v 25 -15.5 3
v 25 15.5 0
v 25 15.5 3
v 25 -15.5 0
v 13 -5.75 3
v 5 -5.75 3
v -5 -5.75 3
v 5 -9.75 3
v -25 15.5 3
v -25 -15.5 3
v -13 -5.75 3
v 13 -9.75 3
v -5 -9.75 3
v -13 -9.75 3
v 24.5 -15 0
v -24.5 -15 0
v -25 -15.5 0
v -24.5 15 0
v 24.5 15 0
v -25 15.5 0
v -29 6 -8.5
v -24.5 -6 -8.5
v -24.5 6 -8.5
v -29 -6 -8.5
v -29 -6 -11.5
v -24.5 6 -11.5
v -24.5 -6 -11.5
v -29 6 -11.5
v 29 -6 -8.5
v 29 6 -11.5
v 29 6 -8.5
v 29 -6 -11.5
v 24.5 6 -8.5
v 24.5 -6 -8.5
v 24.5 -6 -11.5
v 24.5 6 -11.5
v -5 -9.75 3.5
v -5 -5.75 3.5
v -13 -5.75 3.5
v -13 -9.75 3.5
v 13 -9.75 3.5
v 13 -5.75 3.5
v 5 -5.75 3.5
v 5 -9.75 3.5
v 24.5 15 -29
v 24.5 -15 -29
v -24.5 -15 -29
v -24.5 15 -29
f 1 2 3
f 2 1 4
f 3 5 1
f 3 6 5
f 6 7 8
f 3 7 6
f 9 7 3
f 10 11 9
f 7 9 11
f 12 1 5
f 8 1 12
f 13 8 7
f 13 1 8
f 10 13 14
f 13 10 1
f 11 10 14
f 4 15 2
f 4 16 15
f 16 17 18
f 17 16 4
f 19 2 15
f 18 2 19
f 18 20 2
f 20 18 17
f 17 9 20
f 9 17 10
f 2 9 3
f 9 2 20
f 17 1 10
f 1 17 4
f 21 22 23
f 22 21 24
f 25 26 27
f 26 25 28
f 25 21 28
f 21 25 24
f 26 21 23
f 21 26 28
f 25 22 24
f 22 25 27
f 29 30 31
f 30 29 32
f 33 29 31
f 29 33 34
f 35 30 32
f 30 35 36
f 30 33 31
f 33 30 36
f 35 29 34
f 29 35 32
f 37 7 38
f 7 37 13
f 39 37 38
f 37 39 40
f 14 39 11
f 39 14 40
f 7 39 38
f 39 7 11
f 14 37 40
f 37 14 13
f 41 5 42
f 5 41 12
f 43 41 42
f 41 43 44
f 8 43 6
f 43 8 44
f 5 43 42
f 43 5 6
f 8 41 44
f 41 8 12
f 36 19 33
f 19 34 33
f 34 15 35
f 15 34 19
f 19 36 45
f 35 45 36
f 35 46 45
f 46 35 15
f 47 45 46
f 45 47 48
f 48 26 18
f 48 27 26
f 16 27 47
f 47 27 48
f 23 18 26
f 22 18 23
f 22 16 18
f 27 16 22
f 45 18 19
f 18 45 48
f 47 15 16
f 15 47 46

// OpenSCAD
// Parameters
overall_width_mm = 48; //[24:96:1]
overall_height_mm = 29; //[15:58:1]
overall_depth_mm = 24; //[12:48:1]
bezel_width_mm = 50; //[25:100:1]
bezel_height_mm = 31; //[16:62:1]
bezel_thickness_mm = 3; //[1.5:6:0.5]
bezel_corner_radius_mm = 2; //[0:6:0.5]
bezel_bevel_mm = 0.8; //[0:3:0.1]
body_wall_thickness_mm = 1.6; //[0.8:3.2:0.1]
display_window_width_mm = 34; //[17:68:1]
display_window_height_mm = 14; //[7:28:1]
display_window_corner_radius_mm = 1; //[0:4:0.5]
panel_cutout_width_mm = 45; //[22.5:90:1]
panel_cutout_height_mm = 26; //[13:52:1]
panel_thickness_range_mm = 3; //[1:6:0.5]
tab_width_mm = 6; //[3:12:0.5]
tab_height_mm = 12; //[6:24:1]
tab_depth_mm = 3; //[1.5:8:0.5]
tab_offset_z_mm = 10; //[0:20:1]
inner_aperture_width_mm = 40; //[20:80:1]
inner_aperture_height_mm = 20; //[10:40:1]
inner_aperture_depth_mm = 1.2; //[0.6:3:0.1]
button_count = 2; //[0:4:1]
button_width_mm = 8; //[4:16:0.5]
button_height_mm = 4; //[2:10:0.5]
button_depth_mm = 1.5; //[0.8:4:0.1]
assembly_overlap_mm = 1; //[0.5:2:0.1]
clearance_mm = 0.5; //[0.2:1.5:0.1]
rear_clearance_extra_mm = 6; //[3:15:1]

// Panel Meter - complete geometry
module panel_meter() {
  color("Black") {
    // Front Bezel
    translate([0, 0, bezel_thickness_mm / 2])
      cube([bezel_width_mm, bezel_height_mm, bezel_thickness_mm], center=true);
    
    // Meter Body
    translate([0, 0, -overall_depth_mm / 2 + assembly_overlap_mm])
      cube([overall_width_mm, overall_height_mm, overall_depth_mm], center=true);
    
    // Inner Aperture Frame
    difference() {
      translate([0, bezel_height_mm * 0.15, inner_aperture_depth_mm / 2 + assembly_overlap_mm])
        cube([inner_aperture_width_mm, inner_aperture_height_mm, inner_aperture_depth_mm], center=true);
      translate([0, bezel_height_mm * 0.15, inner_aperture_depth_mm / 2 + assembly_overlap_mm])
        cube([display_window_width_mm + 2 * clearance_mm, display_window_height_mm + 2 * clearance_mm, inner_aperture_depth_mm + 2 * assembly_overlap_mm], center=true);
    }
    
    // Mounting Tabs
    translate([-overall_width_mm / 2 - tab_width_mm / 2 + assembly_overlap_mm, 0, -tab_offset_z_mm])
      cube([tab_width_mm, tab_height_mm, tab_depth_mm], center=true);
    translate([overall_width_mm / 2 + tab_width_mm / 2 - assembly_overlap_mm, 0, -tab_offset_z_mm])
      cube([tab_width_mm, tab_height_mm, tab_depth_mm], center=true);
  }
}

// Panel Meter Button - complete geometry
module panel_meter_button() {
  color("Silver") {
    // Front Buttons
    translate([-bezel_width_mm * 0.18, -bezel_height_mm * 0.25, bezel_thickness_mm + button_depth_mm / 2 - assembly_overlap_mm])
      cube([button_width_mm, button_height_mm, button_depth_mm], center=true);
    translate([bezel_width_mm * 0.18, -bezel_height_mm * 0.25, bezel_thickness_mm + button_depth_mm / 2 - assembly_overlap_mm])
      cube([button_width_mm, button_height_mm, button_depth_mm], center=true);
  }
}

// Panel Meter Cutout - complete geometry
module panel_meter_cutout() {
  color("DimGray") {
    // Panel Cutout
    translate([0, 0, -panel_thickness_range_mm / 2])
      cube([panel_cutout_width_mm, panel_cutout_height_mm, panel_thickness_range_mm], center=true);
    
    // Rear Clearance Volume
    translate([0, 0, -(overall_depth_mm + rear_clearance_extra_mm) / 2 + assembly_overlap_mm])
      cube([overall_width_mm + 2 * clearance_mm, overall_height_mm + 2 * clearance_mm, overall_depth_mm + rear_clearance_extra_mm], center=true);
  }
}

// Assembly
module assembly() {
  panel_meter();
  panel_meter_button();
  panel_meter_cutout();
}

assembly();
